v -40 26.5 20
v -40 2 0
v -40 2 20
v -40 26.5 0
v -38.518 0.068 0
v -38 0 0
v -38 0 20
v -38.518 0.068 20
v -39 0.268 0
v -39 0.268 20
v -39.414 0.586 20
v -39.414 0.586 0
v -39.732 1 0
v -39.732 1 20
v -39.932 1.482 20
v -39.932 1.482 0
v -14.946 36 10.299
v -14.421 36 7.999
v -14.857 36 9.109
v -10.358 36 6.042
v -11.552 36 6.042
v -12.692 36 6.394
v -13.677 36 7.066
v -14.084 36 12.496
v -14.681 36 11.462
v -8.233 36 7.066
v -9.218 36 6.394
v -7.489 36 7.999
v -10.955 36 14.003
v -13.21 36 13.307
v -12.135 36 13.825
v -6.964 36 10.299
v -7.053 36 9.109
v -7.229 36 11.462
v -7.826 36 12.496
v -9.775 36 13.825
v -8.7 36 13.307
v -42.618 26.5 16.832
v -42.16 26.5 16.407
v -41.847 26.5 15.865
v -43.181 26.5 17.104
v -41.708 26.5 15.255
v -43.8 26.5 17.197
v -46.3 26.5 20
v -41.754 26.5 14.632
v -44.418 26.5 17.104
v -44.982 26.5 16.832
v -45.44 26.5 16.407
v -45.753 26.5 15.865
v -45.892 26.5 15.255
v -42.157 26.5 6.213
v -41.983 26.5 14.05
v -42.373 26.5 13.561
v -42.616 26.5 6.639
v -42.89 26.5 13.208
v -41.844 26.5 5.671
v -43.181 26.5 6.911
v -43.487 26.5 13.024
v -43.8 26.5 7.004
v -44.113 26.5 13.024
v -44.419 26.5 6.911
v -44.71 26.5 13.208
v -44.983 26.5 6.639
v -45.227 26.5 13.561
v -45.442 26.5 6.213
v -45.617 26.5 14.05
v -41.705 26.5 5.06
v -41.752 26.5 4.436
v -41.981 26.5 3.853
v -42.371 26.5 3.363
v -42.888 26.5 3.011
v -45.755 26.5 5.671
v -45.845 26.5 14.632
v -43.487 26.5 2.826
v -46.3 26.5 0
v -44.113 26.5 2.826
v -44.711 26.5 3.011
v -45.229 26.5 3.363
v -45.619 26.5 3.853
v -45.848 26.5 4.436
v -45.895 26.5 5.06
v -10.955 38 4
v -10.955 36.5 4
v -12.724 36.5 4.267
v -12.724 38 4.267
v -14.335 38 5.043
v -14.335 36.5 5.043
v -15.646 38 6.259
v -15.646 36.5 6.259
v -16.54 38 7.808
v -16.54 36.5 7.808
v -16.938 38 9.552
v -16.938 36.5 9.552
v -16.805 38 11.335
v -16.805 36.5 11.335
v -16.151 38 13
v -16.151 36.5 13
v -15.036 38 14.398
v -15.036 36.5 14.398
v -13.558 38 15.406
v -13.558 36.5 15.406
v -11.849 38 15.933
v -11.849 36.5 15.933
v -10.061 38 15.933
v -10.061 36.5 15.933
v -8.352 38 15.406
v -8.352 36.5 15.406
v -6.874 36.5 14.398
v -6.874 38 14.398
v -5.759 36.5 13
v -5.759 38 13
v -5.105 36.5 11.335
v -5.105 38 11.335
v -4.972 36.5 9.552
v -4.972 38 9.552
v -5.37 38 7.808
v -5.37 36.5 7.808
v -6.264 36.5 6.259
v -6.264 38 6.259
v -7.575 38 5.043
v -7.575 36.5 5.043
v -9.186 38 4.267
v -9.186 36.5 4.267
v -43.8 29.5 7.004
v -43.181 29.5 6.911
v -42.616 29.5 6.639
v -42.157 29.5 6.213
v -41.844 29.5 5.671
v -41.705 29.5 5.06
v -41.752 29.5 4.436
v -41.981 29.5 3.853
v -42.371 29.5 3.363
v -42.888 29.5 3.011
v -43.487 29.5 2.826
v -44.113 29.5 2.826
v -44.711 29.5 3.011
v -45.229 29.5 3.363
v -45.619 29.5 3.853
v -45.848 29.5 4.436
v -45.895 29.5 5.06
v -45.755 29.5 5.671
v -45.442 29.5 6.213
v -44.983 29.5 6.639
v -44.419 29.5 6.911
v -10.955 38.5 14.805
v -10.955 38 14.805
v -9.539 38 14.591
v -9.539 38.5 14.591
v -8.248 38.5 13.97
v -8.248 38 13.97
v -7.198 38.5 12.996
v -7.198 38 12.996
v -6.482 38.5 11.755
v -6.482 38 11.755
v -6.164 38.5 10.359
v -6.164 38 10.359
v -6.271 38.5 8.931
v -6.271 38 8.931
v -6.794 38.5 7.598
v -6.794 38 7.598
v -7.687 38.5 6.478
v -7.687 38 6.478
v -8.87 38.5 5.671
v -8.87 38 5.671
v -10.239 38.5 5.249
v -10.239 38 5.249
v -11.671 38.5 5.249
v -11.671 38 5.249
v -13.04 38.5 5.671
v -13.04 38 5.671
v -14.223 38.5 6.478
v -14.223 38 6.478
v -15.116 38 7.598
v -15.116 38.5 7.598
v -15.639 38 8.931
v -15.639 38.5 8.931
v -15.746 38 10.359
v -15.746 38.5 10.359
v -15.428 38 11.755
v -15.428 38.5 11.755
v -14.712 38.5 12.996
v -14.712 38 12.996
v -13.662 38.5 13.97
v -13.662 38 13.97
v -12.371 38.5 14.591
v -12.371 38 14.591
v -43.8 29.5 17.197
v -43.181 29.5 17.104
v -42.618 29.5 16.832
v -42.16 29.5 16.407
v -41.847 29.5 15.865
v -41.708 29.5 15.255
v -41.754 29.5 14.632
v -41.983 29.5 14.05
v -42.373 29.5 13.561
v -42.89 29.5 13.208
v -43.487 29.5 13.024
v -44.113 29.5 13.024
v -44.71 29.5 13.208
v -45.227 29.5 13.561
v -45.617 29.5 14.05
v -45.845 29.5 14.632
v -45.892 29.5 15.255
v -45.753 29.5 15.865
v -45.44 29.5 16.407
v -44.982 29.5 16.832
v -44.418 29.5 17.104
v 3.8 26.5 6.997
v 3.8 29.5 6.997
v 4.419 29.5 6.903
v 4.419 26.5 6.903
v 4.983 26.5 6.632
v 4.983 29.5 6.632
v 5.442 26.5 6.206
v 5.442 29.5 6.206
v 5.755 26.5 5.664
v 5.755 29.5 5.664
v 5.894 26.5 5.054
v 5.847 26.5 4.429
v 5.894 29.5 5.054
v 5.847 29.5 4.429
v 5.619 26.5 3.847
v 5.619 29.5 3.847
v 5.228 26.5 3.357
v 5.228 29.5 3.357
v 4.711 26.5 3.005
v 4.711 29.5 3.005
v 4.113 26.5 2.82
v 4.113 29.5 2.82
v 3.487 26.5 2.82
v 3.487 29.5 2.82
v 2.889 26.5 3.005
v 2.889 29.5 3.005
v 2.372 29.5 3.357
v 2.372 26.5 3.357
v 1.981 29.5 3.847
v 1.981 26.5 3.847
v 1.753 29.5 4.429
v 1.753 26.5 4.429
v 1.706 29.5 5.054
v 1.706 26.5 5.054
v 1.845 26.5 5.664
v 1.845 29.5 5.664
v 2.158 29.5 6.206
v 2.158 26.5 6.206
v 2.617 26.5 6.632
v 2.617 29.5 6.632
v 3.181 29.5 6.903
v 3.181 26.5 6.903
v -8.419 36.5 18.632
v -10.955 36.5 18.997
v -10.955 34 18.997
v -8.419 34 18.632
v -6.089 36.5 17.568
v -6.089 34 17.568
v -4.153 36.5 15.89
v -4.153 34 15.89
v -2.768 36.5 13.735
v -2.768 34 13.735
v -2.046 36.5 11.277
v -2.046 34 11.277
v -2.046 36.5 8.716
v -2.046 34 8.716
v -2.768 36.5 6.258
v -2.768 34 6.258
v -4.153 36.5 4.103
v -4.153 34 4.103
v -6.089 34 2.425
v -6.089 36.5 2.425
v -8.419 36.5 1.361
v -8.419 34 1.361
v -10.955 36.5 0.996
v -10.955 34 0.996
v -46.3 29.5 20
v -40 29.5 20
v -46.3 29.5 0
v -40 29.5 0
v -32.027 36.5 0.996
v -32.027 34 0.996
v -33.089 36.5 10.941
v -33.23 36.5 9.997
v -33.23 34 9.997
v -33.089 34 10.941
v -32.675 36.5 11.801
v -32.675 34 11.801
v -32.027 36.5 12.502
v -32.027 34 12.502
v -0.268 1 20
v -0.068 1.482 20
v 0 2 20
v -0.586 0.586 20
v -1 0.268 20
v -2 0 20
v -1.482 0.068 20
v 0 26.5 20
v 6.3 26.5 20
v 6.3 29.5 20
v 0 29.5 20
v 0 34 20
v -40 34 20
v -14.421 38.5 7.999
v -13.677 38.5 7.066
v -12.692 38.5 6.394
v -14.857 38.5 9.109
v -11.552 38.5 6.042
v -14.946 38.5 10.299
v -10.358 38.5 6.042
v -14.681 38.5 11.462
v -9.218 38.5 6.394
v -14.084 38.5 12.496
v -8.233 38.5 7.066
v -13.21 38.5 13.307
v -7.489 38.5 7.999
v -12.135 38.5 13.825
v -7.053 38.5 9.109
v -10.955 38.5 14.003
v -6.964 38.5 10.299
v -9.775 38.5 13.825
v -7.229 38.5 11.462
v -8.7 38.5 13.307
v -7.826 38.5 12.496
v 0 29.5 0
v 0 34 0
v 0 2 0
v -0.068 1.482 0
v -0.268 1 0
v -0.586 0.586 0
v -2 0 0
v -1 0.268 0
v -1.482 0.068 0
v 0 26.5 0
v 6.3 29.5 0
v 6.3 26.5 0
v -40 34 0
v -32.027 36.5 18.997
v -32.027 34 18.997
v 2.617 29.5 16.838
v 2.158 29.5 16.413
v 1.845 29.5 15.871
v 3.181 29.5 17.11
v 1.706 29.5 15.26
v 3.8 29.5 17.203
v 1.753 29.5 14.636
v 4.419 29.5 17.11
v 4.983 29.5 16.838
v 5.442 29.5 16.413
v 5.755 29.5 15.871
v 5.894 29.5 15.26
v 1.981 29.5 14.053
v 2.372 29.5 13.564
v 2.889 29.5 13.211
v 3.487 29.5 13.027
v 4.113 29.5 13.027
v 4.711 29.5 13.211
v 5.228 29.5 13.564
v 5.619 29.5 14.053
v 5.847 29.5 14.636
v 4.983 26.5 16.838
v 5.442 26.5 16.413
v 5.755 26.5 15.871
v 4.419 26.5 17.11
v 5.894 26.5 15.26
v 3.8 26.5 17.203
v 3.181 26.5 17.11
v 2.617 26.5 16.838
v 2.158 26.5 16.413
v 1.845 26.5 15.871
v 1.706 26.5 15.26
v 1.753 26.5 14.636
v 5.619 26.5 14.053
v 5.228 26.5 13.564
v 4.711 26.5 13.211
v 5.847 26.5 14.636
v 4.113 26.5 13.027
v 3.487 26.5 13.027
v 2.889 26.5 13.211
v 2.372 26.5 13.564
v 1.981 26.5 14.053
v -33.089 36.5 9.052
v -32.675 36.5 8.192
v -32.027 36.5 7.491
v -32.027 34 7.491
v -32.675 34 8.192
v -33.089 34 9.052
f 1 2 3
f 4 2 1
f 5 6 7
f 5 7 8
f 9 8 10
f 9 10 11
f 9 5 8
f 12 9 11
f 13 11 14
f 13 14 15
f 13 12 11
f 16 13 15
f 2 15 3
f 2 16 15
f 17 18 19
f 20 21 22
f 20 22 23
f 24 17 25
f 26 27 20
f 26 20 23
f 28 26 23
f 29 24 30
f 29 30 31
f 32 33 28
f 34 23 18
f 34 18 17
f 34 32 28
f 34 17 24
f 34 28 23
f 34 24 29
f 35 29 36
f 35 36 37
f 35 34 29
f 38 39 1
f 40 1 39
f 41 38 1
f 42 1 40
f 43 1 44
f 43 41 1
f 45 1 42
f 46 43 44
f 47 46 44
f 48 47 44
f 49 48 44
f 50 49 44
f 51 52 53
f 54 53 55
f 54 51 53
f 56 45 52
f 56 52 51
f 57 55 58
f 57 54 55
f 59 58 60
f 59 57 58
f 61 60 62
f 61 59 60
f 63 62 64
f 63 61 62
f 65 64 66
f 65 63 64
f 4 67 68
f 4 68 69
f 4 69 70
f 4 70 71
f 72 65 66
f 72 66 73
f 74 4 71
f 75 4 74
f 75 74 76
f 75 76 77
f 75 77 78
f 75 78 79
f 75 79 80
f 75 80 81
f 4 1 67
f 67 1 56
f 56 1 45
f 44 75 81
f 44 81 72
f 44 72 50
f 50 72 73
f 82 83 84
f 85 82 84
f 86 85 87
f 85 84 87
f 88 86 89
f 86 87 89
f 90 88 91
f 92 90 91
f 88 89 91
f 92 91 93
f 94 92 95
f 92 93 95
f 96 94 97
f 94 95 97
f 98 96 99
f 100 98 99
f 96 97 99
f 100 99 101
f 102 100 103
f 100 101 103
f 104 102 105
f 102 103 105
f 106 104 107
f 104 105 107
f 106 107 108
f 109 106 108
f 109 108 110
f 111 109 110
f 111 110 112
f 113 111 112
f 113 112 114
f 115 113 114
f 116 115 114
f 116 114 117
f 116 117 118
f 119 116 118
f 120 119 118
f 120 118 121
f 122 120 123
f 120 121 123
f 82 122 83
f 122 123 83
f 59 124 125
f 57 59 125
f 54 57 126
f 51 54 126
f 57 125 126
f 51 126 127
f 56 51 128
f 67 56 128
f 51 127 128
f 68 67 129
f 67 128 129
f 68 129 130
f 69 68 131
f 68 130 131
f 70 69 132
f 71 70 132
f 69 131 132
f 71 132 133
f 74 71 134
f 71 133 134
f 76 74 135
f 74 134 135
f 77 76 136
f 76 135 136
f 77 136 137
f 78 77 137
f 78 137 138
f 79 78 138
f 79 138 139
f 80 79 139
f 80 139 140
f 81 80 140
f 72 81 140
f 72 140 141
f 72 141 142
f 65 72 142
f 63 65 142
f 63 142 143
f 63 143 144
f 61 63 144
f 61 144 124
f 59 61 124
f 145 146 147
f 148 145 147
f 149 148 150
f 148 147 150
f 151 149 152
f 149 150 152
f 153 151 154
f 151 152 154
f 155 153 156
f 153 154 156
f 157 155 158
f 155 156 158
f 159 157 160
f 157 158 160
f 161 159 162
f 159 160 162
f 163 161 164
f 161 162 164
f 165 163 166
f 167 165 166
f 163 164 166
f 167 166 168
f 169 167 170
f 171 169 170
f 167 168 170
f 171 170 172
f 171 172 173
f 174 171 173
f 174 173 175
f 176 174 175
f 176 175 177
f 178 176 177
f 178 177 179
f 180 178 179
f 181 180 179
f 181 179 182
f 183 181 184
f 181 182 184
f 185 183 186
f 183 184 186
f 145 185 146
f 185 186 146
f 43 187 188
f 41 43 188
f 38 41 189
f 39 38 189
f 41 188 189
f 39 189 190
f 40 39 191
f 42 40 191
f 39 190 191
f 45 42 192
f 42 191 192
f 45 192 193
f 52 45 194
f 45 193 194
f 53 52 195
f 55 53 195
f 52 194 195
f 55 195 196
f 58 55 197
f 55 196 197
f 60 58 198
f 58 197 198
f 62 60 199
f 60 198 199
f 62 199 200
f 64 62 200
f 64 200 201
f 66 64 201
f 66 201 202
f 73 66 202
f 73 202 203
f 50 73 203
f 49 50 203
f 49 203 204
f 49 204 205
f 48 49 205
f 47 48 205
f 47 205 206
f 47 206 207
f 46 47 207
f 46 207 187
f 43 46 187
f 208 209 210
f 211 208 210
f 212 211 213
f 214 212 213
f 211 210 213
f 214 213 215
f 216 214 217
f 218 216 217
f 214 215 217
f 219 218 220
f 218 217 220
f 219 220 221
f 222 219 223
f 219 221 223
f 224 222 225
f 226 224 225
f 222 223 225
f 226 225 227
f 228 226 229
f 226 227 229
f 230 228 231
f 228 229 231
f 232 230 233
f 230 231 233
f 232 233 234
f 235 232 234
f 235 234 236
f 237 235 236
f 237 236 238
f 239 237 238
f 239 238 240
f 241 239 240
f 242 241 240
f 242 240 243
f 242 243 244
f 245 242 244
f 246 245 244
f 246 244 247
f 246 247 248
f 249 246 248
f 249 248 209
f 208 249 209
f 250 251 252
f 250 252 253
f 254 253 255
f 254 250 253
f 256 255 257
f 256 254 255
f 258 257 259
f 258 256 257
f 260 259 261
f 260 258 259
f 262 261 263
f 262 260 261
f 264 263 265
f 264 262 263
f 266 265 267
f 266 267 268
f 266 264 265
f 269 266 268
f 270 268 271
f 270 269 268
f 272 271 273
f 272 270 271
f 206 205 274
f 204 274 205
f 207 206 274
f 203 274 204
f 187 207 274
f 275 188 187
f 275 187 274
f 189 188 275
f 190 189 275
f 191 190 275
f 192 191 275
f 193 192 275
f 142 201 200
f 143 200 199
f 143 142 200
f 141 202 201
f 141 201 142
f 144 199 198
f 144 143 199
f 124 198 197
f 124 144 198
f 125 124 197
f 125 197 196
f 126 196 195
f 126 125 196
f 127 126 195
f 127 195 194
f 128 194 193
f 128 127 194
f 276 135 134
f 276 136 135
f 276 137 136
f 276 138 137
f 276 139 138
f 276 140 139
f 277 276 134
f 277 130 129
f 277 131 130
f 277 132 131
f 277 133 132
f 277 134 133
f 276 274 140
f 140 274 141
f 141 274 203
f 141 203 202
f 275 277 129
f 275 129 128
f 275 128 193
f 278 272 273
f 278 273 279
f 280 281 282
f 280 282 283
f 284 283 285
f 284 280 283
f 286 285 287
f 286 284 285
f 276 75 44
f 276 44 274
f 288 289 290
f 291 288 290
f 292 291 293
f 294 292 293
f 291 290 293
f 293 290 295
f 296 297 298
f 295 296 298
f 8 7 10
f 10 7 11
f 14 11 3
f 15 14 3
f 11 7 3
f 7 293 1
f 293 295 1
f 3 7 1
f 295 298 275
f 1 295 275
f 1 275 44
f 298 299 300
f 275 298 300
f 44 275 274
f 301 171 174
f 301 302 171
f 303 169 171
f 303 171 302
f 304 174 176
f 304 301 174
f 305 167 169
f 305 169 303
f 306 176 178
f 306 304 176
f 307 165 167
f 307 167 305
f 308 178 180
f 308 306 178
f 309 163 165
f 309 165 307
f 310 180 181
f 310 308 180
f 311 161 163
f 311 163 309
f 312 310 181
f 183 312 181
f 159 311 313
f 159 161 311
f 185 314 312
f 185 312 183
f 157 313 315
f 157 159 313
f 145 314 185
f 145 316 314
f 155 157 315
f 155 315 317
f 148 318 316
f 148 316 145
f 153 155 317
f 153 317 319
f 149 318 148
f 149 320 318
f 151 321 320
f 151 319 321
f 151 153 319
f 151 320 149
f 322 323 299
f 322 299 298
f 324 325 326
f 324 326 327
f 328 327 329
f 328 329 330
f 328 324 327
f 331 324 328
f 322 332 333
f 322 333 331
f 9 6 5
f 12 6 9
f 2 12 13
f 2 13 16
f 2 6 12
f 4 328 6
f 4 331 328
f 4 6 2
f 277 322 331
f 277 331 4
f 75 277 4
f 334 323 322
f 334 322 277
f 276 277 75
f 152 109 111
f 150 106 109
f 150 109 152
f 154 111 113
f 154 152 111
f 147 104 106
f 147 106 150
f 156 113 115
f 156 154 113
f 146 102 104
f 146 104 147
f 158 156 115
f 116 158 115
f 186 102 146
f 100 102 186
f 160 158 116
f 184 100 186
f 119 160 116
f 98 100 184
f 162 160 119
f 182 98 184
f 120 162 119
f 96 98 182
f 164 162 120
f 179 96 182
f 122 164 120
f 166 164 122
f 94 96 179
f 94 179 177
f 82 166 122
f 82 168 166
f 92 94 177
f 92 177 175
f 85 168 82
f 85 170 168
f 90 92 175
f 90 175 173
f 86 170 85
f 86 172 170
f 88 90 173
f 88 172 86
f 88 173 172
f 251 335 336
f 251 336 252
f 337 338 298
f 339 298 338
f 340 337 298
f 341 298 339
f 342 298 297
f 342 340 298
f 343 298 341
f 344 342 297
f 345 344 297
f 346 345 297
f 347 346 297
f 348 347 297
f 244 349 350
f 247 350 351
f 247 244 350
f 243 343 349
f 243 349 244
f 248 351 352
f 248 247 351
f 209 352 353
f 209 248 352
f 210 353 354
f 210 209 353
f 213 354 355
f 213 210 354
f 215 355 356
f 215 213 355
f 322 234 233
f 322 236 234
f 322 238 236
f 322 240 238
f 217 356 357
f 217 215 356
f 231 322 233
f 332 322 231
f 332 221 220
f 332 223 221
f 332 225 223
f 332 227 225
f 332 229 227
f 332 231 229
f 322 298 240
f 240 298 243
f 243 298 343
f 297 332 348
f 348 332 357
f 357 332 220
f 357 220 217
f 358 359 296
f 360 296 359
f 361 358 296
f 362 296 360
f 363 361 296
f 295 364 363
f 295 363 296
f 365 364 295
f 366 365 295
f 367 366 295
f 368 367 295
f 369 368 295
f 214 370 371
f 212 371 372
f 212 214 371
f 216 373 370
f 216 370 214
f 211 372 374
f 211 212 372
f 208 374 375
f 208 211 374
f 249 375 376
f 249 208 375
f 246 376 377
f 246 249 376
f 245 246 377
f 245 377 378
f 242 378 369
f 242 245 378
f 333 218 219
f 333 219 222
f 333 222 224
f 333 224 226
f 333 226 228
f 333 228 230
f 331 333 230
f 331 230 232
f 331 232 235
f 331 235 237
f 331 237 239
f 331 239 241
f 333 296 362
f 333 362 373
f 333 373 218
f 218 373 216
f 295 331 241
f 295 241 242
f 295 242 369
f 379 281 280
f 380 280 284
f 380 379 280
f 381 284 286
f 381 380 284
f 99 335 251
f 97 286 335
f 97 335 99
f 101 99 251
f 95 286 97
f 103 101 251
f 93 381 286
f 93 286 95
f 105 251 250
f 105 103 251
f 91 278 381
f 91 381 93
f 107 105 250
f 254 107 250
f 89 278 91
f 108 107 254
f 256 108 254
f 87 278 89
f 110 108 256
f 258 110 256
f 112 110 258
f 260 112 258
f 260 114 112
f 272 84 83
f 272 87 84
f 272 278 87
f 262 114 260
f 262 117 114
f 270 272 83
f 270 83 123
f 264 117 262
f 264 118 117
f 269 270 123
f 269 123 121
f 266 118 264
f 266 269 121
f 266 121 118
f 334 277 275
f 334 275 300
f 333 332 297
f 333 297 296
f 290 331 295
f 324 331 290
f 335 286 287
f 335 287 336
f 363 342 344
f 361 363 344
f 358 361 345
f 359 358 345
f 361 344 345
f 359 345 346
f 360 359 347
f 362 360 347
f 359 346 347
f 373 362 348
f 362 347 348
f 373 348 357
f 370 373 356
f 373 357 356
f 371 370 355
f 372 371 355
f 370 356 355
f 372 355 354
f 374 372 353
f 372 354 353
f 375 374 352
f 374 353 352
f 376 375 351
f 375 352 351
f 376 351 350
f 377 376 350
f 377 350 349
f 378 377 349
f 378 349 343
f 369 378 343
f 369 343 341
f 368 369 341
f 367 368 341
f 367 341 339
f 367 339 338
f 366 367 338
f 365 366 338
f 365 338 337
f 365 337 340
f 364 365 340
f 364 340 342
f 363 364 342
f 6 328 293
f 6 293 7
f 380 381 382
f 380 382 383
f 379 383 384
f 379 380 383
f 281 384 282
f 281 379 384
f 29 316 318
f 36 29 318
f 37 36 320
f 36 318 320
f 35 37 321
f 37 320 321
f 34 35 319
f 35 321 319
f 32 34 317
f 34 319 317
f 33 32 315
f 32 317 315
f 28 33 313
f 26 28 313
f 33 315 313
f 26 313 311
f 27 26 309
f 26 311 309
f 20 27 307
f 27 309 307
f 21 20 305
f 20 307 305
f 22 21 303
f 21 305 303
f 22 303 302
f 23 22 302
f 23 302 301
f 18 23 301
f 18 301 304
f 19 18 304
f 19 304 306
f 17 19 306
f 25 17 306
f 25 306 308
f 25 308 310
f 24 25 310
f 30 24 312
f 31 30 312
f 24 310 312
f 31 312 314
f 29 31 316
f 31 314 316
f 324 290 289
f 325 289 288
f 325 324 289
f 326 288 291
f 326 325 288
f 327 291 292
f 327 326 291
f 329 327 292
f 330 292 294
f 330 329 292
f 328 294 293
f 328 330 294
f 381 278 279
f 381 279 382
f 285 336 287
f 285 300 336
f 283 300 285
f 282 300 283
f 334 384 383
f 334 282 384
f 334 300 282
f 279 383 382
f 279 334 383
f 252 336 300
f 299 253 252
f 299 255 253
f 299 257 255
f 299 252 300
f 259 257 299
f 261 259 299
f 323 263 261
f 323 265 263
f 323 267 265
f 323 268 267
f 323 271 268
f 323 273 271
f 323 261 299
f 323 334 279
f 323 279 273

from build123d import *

# Parameters (mm, degrees)
BOSS_EXTRUDE1_DEPTH = 20
SKETCH2_R           = 2.1
CUT_EXTRUDE1_DEPTH  = 20
SKETCH3_R           = 2.098017688
SKETCH3_R_2         = 2.10074066
CUT_EXTRUDE2_DEPTH  = 20
SKETCH7_R           = 6
BOSS_EXTRUDE2_DEPTH = 1.5
SKETCH8_R           = 4.804871241
BOSS_EXTRUDE3_DEPTH = 0.5
SKETCH9_R           = 4.002646766
CUT_EXTRUDE5_DEPTH  = 2.5
SKETCH10_OUTSIDE_W  = 68.236
SKETCH10_OUTSIDE_H  = 35.636
CUT_EXTRUDE6_DEPTH  = 2.5
BOSS_EXTRUDE4_DEPTH = 2.5


with BuildPart() as part:
    # Sketch1 → Boss-Extrude1 (new body)
    with BuildSketch(Plane.XY):
        with BuildLine():
            Line((-2, 0), (-38, 0))
            ThreePointArc((-38, 0), (-39.414213562, 0.585786438), (-40, 2))
            Line((-40, 2), (-40, 26.5))
            Line((-40, 26.5), (-46.3, 26.5))
            Line((-46.3, 26.5), (-46.3, 29.5))
            Line((-46.3, 29.5), (-40, 29.5))
            Line((-40, 29.5), (-40, 34))
            Line((-40, 34), (-33, 34))
            Line((-33, 34), (-33, 36.5))
            Line((-33, 36.5), (0, 36.5))
            Line((0, 36.5), (0, 29.5))
            Line((0, 29.5), (6.3, 29.5))
            Line((6.3, 29.5), (6.3, 26.5))
            Line((6.3, 26.5), (0, 26.5))
            Line((0, 26.5), (0, 2))
            ThreePointArc((0, 2), (-0.585786438, 0.585786438), (-2, 0))
        make_face()
    extrude(amount=BOSS_EXTRUDE1_DEPTH)

    # Sketch2 → Cut-Extrude1 (cut)
    with BuildSketch(Plane(origin=(0, 29.5, 0), x_dir=(1, 0, 0), z_dir=(0, 1, 0))):
        with Locations(Location((3.8, -15.10338686, 0), (0, 0, 270))):
            Circle(SKETCH2_R)
        with Locations(Location((3.8, -4.896599974, 0), (0, 0, 270))):
            Circle(SKETCH2_R)
    extrude(amount=-CUT_EXTRUDE1_DEPTH, mode=Mode.SUBTRACT)

    # Sketch3 → Cut-Extrude2 (cut)
    with BuildSketch(Plane(origin=(0, 29.5, 0), x_dir=(1, 0, 0), z_dir=(0, 1, 0))):
        with Locations(Location((-43.799859357, -15.098694551, 0), (0, 0, 270))):
            Circle(SKETCH3_R)
        with Locations(Location((-43.799859357, -4.903327435, 0), (0, 0, 270))):
            Circle(SKETCH3_R_2)
    extrude(amount=-CUT_EXTRUDE2_DEPTH, mode=Mode.SUBTRACT)

    # Sketch7 → Boss-Extrude2 (add)
    with BuildSketch(Plane(origin=(0, 36.5, 0), x_dir=(1, 0, 0), z_dir=(0, 1, 0))):
        with Locations(Location((-10.95500567, -10, 0), (0, 0, 90))):
            Circle(SKETCH7_R)
    extrude(amount=BOSS_EXTRUDE2_DEPTH)

    # Sketch8 → Boss-Extrude3 (add)
    with BuildSketch(Plane(origin=(0, 38, 0), x_dir=(1, 0, 0), z_dir=(0, 1, 0))):
        with Locations(Location((-10.95500567, -10, 0), (0, 0, 270))):
            Circle(SKETCH8_R)
    extrude(amount=BOSS_EXTRUDE3_DEPTH)

    # Sketch9 → Cut-Extrude5 (cut)
    with BuildSketch(Plane(origin=(0, 38.5, 0), x_dir=(1, 0, 0), z_dir=(0, 1, 0))):
        with Locations(Location((-10.95500567, -10, 0), (0, 0, 270))):
            Circle(SKETCH9_R)
    extrude(amount=-CUT_EXTRUDE5_DEPTH, mode=Mode.SUBTRACT)

    # Sketch10 outside → Cut-Extrude6 (cut)
    with BuildSketch(Plane(origin=(0, 36.5, 0), x_dir=(1, 0, 0), z_dir=(0, 1, 0))):
        with Locations((-20, -10)):
            Rectangle(SKETCH10_OUTSIDE_W, SKETCH10_OUTSIDE_H)
        with BuildLine():
            Line((-32.027169465, -18.996750159), (-10.95500567, -18.996750159))
            ThreePointArc((-10.95500567, -18.996750159), (-1.954759683, -9.996504172), (-10.95500567, -0.996258185))
            Line((-10.95500567, -0.996258185), (-32.027169465, -0.996258185))
            Line((-32.027169465, -0.996258185), (-32.027169465, -18.996750159))
        make_face(mode=Mode.SUBTRACT)
    extrude(amount=-CUT_EXTRUDE6_DEPTH, mode=Mode.SUBTRACT)

    # Sketch11 → Boss-Extrude4 (add)
    with BuildSketch(Plane(origin=(0, 36.5, 0), x_dir=(1, 0, 0), z_dir=(0, 1, 0))):
        with BuildLine():
            Line((-32.027169465, -12.502490339), (-32.027169465, -7.490518005))
            ThreePointArc((-32.027169465, -7.490518005), (-32.914070297, -8.60654479), (-33.230490565, -9.996504172))
            ThreePointArc((-33.230490565, -9.996504172), (-32.914070297, -11.386463554), (-32.027169465, -12.502490339))
        make_face()
    extrude(amount=-BOSS_EXTRUDE4_DEPTH)


solid = part.part
